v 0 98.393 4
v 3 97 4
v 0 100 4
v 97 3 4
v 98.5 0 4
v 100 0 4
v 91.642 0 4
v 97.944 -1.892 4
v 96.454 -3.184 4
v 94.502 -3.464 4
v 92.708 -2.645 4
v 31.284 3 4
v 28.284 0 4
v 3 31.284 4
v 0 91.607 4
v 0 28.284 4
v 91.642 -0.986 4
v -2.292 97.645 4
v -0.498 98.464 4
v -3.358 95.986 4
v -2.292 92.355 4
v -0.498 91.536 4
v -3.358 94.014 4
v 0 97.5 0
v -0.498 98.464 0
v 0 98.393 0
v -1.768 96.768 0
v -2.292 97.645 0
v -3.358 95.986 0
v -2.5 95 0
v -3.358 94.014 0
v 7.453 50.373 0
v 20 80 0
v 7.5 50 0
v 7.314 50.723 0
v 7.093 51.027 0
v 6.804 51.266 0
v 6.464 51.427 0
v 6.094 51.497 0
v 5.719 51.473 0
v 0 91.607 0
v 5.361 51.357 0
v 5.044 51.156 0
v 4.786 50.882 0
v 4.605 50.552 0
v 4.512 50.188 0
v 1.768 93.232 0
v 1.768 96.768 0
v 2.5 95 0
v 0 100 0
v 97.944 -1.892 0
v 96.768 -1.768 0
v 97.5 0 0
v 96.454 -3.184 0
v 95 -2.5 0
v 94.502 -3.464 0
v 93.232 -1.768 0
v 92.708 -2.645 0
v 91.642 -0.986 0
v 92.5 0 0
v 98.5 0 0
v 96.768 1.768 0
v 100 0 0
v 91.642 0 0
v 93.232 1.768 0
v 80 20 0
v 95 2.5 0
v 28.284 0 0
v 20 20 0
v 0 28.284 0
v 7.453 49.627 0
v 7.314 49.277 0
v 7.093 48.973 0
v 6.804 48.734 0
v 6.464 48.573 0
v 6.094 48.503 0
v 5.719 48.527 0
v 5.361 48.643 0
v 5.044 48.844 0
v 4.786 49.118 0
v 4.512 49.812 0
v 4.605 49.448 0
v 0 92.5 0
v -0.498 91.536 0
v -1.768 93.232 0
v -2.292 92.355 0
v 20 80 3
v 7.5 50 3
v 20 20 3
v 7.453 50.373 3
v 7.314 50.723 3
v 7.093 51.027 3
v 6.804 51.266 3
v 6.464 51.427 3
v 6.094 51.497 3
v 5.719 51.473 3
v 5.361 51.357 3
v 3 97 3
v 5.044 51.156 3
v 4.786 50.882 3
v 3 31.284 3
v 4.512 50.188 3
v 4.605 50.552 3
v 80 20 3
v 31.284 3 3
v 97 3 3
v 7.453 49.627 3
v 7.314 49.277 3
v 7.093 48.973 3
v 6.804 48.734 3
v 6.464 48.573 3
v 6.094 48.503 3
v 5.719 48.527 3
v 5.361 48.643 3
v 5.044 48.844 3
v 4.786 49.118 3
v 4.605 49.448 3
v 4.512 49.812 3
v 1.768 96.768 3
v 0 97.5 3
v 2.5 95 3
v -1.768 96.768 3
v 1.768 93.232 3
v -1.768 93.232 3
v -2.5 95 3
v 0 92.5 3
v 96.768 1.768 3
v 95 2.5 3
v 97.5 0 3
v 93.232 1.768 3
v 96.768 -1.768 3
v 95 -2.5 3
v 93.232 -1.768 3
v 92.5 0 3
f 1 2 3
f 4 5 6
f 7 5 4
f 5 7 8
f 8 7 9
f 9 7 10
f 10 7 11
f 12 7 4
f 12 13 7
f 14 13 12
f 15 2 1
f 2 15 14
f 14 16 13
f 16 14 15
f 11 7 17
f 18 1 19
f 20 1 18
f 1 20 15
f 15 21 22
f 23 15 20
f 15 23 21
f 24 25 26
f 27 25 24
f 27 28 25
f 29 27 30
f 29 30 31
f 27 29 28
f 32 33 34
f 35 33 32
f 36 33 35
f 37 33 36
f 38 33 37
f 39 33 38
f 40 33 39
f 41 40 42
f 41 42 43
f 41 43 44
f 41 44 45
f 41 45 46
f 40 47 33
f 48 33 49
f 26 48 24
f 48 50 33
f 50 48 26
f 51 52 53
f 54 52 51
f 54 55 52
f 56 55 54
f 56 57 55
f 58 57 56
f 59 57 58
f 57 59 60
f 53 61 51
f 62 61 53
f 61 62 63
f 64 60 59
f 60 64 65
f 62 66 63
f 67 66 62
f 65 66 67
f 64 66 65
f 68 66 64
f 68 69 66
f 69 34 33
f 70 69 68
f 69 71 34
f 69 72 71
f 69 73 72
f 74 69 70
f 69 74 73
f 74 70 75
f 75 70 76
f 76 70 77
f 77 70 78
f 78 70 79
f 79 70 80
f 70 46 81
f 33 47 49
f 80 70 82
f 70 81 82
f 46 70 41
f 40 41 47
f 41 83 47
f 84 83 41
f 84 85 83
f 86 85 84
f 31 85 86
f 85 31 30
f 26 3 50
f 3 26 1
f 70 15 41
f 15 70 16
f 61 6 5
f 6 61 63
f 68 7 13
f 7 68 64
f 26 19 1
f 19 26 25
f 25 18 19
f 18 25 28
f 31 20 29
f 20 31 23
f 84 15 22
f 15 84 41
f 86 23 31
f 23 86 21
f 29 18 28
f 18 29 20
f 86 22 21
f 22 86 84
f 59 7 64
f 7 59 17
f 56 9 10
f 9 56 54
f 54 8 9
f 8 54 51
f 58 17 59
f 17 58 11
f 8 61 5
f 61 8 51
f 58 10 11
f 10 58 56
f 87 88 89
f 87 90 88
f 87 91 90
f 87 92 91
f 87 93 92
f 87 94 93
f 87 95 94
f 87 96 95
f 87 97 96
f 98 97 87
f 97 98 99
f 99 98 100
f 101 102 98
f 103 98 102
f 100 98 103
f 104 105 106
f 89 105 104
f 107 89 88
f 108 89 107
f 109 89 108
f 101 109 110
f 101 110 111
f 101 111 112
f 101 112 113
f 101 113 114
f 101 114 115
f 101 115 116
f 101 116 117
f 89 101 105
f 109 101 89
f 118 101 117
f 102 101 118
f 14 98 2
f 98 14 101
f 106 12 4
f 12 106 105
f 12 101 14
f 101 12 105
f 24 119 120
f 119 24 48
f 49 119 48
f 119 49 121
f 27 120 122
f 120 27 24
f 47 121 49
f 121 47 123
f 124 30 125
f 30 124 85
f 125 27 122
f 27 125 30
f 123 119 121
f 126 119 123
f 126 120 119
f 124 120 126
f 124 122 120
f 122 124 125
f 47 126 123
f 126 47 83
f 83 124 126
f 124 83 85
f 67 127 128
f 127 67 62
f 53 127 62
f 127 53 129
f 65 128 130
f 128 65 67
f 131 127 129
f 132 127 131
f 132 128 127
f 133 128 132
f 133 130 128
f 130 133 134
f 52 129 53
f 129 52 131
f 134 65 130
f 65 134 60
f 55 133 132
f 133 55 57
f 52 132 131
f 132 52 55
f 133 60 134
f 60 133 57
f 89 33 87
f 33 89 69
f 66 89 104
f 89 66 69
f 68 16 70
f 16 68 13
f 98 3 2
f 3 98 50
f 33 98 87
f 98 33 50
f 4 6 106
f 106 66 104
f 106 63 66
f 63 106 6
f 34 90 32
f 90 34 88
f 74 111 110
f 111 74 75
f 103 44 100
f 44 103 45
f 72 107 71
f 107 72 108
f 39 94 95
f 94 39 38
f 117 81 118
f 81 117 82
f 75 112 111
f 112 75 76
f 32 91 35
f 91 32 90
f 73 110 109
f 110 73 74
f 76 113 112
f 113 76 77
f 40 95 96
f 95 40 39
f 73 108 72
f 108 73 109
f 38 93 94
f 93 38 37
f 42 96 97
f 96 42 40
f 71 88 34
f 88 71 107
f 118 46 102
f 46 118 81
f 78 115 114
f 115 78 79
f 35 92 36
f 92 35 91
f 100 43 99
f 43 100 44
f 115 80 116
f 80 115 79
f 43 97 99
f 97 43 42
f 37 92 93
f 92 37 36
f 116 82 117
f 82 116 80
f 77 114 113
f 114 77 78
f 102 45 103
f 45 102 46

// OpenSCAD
// these are all guesses ATM, but the bounding box should be limited to 100mm3
length = 100;
height = 100;
depth = 4;
frame_width = 20;
shelf_thickness = 3;
perimeter_thickness = 3;
screw_diameter = 3;
tab_diameter = 5;

difference(){
    
    // bounding box
    union(){
        // frame
        cube([length, height, depth]);
        
        // tab mounts
        // upper tab
        translate([0,height-5,0]){
            cylinder(r=tab_diameter/2+1,h=depth);
        }

        // lower tab hole
        translate([length-5,0,0]){
            cylinder(r=tab_diameter/2+1,h=depth);
        }
    }
    
    // upper tab hole
    translate([0,height-5,-1]){
            cylinder(r=tab_diameter/2,h=depth);
    }
    
    // lower tab hole
    translate([length-5,0,-1]){
        cylinder(r=tab_diameter/2,h=depth);
    }

/*
    }
*/
    
    // main cut-out
    translate([frame_width, frame_width, -1]){
        cube([length, height, depth + 2]);
    }
    
    // this prevents shelf cut from penetrating the perimeter
    difference(){
        
        // shelf cut-out
        translate([perimeter_thickness, perimeter_thickness,        shelf_thickness]){
            cube([length, height, depth + 2]);
        }    
        
        // outer slash cut
        translate([perimeter_thickness, perimeter_thickness,0]){
            rotate([0,0,-45]){
                translate([-length,0,-1]){
                    cube([length *2, frame_width, depth +2]);
                }
            }     
        } 
    }
    
    // outer slash cut
    rotate([0,0,-45]){
        translate([-length,0,-1]){
            cube([length *2, frame_width, depth +2]);
        }
    }
    
    // inner slash cut
    translate([length/2, height/2, 0]){
        rotate([0,0,-45]){
            translate([-length,0,-1]){
                cube([length *2, frame_width, depth +2]);
            }
        }
    }

    // mounting hole (complete guess for now)
    translate([perimeter_thickness*2, height/2,-1]){
        cylinder(r=screw_diameter/2,h=shelf_thickness+2,$fn=25);
    }
}
